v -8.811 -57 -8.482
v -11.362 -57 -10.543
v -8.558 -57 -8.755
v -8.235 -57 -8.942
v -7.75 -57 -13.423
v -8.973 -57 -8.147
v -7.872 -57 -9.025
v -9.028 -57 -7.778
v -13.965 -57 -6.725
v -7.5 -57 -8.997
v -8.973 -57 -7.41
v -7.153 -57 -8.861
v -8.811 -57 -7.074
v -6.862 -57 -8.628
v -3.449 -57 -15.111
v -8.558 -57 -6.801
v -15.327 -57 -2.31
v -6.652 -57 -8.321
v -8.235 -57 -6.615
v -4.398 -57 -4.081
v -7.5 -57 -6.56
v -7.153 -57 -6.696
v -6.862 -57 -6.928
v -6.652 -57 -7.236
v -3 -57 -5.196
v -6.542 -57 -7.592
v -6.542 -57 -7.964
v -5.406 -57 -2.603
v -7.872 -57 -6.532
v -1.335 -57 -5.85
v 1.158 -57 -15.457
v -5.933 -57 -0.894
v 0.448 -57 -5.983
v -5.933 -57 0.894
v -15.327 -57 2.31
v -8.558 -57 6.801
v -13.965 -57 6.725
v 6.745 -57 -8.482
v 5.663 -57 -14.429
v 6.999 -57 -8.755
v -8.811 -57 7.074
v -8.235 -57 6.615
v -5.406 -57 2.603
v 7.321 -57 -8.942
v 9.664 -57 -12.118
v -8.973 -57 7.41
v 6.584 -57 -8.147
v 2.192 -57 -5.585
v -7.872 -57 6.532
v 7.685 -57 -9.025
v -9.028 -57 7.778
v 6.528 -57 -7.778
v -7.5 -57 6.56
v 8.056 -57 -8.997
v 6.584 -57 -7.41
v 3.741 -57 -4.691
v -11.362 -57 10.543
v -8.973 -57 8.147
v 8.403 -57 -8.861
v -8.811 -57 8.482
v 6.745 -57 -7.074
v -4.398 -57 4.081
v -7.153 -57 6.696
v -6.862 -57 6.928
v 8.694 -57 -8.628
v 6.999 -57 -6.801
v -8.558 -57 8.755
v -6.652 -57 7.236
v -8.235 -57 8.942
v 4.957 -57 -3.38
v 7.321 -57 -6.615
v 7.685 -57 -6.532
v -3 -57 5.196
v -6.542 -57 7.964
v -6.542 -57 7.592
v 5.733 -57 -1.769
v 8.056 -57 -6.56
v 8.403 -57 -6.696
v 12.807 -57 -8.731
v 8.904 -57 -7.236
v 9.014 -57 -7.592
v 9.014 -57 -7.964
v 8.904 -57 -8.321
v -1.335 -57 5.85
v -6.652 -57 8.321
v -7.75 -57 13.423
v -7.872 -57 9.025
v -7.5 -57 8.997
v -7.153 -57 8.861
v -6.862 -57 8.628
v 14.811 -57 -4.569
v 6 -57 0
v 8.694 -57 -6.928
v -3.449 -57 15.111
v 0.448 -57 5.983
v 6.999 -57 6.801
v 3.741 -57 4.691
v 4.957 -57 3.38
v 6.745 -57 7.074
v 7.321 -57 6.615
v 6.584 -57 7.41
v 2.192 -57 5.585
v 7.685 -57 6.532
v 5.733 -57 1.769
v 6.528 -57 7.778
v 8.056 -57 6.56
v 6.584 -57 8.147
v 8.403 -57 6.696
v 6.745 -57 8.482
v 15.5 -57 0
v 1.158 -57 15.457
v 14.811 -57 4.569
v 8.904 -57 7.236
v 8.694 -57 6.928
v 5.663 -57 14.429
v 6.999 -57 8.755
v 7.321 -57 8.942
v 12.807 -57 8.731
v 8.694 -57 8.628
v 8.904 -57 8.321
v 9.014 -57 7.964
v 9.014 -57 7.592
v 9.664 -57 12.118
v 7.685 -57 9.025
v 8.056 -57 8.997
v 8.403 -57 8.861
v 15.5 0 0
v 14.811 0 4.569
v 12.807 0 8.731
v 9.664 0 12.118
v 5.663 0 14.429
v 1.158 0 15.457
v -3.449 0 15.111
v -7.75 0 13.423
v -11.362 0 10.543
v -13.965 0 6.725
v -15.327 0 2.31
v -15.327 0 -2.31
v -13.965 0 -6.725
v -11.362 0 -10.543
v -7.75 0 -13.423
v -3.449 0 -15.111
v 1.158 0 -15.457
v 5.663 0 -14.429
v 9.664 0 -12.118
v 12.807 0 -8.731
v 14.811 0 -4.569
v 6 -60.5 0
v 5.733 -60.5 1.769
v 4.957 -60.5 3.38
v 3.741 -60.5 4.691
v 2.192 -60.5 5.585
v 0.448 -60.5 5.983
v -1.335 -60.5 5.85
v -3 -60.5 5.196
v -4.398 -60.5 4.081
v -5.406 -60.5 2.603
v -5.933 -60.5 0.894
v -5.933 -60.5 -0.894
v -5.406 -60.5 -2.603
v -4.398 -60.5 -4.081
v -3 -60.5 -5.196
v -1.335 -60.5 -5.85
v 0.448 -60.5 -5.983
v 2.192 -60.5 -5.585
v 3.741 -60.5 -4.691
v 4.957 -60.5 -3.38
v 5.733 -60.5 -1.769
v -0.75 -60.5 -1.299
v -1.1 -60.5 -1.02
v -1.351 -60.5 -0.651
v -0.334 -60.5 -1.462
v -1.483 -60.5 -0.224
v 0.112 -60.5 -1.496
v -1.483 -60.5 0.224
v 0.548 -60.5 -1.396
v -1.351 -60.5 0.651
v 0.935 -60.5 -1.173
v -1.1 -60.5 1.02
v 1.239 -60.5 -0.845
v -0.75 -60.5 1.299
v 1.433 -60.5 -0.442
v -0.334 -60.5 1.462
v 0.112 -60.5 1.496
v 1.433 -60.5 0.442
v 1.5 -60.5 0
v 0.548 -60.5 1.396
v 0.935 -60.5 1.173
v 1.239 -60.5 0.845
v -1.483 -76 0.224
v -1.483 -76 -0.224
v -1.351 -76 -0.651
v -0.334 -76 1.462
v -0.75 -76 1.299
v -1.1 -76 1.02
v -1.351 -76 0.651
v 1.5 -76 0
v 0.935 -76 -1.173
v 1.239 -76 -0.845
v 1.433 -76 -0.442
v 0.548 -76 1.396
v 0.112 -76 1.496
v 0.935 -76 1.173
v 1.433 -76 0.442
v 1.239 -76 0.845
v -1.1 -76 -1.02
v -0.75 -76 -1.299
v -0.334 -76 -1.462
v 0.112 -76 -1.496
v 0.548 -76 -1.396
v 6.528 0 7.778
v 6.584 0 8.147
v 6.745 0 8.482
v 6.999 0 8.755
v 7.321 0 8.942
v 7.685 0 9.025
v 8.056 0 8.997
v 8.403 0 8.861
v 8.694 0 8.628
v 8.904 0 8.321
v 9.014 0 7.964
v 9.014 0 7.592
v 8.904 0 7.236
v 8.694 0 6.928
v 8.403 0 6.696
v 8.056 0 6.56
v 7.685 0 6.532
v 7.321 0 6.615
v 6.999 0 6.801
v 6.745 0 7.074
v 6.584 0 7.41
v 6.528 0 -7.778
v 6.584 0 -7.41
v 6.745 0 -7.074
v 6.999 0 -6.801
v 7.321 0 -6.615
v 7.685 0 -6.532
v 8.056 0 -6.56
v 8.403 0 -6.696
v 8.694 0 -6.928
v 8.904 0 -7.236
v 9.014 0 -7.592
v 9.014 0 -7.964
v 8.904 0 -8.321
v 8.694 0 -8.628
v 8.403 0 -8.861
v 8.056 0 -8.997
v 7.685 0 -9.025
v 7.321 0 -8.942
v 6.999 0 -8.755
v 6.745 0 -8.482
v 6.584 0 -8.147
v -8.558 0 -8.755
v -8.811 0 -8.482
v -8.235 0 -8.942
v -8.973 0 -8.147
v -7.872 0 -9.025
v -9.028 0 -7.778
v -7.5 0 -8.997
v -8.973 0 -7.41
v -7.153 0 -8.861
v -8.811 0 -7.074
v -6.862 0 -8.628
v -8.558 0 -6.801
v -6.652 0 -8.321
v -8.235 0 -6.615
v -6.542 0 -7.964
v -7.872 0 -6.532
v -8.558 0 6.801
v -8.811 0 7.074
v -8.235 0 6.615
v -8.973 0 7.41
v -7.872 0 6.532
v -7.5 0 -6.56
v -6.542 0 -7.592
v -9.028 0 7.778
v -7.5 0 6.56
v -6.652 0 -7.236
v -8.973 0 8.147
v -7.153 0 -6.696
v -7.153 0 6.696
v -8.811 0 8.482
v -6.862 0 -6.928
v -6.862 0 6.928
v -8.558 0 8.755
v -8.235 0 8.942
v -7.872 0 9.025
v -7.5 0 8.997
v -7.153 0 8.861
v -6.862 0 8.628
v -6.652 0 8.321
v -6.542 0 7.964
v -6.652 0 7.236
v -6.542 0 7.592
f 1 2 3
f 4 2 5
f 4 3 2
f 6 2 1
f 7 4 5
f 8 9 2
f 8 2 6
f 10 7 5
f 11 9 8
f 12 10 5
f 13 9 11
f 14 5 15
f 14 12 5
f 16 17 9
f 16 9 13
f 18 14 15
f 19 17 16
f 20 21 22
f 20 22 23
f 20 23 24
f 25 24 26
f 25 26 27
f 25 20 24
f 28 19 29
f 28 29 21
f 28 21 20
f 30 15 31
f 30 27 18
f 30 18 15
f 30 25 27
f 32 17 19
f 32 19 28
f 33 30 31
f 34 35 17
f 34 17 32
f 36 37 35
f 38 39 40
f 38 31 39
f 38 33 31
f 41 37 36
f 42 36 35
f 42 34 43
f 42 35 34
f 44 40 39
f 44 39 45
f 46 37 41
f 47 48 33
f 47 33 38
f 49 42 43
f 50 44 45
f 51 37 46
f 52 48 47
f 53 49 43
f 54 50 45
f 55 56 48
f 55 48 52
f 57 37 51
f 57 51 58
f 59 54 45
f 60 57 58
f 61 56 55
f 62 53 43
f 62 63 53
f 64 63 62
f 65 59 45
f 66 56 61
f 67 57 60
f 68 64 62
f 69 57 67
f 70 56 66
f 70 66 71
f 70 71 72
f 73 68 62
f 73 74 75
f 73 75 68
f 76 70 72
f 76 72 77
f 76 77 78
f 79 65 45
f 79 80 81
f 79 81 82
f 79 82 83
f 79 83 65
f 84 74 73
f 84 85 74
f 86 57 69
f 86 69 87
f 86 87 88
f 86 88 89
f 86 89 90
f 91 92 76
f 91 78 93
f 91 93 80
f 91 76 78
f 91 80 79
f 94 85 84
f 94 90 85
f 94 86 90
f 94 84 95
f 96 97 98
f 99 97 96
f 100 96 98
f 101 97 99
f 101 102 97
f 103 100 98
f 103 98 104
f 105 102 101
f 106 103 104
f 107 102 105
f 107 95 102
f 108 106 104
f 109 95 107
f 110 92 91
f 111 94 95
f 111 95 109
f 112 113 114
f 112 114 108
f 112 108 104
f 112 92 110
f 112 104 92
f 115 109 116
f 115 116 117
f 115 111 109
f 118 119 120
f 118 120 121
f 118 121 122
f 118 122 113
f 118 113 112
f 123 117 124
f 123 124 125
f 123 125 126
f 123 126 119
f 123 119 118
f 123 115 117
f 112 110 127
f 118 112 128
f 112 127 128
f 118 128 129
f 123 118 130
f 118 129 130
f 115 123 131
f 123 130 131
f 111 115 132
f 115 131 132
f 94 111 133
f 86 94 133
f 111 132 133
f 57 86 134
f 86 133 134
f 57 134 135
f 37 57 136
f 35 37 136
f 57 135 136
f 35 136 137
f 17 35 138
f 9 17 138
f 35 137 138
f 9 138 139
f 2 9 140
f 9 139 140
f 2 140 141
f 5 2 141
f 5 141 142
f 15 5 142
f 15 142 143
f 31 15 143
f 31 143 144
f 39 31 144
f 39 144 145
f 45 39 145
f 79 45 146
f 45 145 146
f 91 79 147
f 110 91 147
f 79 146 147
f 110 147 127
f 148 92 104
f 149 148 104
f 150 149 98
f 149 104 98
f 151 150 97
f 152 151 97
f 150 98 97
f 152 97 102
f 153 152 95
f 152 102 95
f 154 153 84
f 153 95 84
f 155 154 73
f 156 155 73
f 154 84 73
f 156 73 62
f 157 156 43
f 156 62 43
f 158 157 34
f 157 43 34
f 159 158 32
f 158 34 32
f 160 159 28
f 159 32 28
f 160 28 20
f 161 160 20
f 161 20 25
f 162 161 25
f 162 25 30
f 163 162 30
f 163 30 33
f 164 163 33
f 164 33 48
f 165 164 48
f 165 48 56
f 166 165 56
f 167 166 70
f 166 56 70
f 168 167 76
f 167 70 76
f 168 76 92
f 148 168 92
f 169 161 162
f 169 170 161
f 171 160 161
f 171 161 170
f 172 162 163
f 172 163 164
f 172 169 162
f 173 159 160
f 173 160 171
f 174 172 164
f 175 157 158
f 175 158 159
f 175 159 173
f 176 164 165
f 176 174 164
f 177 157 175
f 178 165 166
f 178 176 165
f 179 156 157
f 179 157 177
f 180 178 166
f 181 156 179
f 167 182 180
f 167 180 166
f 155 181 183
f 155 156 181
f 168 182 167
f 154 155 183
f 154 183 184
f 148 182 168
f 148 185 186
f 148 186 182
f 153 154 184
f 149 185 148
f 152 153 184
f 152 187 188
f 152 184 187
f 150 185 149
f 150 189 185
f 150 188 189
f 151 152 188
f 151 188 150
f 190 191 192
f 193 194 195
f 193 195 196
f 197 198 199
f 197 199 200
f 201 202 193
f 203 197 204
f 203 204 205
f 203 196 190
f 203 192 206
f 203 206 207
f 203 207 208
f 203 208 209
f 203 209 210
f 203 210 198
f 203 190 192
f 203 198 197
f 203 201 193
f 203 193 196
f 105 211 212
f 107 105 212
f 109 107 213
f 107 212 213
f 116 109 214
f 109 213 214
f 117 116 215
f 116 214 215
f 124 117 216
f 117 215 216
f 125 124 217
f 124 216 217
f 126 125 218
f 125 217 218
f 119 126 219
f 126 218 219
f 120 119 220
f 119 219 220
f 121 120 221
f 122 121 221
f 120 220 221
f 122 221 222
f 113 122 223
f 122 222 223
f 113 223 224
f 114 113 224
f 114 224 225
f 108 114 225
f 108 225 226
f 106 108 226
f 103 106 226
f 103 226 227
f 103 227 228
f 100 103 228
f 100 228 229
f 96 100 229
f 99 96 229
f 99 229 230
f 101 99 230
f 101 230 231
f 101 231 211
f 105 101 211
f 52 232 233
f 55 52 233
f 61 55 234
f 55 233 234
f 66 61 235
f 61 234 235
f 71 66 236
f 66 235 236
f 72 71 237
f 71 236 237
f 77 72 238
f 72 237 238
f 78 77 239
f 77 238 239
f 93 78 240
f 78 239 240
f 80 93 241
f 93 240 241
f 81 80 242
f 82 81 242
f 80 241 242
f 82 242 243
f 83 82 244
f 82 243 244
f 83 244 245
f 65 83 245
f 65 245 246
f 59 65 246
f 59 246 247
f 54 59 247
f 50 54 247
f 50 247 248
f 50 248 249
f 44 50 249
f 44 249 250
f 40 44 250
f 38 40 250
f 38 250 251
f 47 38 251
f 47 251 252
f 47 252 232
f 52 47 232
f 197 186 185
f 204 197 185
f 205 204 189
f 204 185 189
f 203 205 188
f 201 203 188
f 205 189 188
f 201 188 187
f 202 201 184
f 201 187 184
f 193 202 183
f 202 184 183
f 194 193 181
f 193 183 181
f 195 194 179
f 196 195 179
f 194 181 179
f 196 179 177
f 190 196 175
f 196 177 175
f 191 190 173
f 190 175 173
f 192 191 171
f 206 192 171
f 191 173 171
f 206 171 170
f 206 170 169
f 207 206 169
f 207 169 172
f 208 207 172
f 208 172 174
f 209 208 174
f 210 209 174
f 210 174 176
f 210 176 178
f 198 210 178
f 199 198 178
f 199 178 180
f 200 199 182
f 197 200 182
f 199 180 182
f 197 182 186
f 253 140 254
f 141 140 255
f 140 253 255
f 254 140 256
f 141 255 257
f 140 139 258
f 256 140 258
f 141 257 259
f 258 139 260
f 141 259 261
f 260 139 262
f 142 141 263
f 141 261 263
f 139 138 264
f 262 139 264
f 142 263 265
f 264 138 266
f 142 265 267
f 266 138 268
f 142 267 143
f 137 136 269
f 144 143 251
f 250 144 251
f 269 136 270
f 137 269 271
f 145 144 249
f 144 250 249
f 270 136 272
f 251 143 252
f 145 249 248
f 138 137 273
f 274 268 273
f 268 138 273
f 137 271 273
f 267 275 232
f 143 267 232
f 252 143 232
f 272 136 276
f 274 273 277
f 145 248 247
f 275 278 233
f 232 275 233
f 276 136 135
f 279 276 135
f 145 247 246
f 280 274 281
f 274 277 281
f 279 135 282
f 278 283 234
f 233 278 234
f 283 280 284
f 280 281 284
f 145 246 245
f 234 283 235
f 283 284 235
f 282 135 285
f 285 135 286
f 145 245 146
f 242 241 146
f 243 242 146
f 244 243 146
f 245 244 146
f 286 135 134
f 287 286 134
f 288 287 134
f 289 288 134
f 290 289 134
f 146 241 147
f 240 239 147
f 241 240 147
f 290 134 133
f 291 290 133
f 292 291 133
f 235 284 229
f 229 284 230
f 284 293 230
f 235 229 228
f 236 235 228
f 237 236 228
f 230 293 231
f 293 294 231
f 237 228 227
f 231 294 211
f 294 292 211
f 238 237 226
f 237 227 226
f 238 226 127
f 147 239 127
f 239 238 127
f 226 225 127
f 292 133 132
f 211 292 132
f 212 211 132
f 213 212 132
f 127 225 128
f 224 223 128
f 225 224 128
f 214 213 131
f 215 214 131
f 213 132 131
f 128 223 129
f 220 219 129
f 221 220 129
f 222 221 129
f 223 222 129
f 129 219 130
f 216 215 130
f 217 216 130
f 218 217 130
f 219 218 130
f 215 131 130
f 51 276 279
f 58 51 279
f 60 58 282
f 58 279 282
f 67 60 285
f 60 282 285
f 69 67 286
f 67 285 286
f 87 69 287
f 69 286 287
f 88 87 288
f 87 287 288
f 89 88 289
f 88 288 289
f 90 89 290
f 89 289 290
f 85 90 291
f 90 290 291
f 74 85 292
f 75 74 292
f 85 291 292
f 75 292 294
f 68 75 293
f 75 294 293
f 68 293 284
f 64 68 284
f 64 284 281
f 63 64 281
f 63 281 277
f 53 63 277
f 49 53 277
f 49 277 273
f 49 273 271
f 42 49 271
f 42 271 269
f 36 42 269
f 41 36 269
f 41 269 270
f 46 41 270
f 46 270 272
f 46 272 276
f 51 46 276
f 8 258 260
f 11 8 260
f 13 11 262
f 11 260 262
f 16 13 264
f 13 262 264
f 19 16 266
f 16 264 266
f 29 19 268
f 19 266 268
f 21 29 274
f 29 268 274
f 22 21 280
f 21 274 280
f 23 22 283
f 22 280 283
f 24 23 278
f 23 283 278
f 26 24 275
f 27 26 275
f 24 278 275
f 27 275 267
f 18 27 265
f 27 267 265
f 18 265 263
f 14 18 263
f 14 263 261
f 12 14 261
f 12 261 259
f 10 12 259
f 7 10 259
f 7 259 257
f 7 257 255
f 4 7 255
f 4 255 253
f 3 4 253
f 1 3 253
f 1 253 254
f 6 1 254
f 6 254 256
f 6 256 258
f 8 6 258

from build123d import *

# Parameters (mm, degrees)
F0_R     = 15.5
F1_DEPTH = 57
F2_R     = 6
F3_DEPTH = 3.5
F4_R     = 1.5
F5_DEPTH = 15.5
F6_D     = 2.5


with BuildPart() as f1:
    # F0 (on Front) → F1 (new body)
    with BuildSketch(Plane.XZ):
        Circle(F0_R)
    extrude(amount=F1_DEPTH)

    # F2 (on face) → F3 (join)
    with BuildSketch(Plane.XZ.offset(57)):
        Circle(F2_R)
    extrude(amount=F3_DEPTH)

    # F4 (on face) → F5 (join)
    with BuildSketch(Plane.XZ.offset(60.5)):
        Circle(F4_R)
    extrude(amount=F5_DEPTH)

    # F6 (through all)
    with Locations(Plane.XZ.offset(57)):
        with Locations((-7.7781745931, 7.7781745931), (7.7781745931, 7.7781745931), (7.7781745931, -7.7781745931), (-7.7781745931, -7.7781745931)):
            Hole(F6_D / 2)


solid = f1.part
